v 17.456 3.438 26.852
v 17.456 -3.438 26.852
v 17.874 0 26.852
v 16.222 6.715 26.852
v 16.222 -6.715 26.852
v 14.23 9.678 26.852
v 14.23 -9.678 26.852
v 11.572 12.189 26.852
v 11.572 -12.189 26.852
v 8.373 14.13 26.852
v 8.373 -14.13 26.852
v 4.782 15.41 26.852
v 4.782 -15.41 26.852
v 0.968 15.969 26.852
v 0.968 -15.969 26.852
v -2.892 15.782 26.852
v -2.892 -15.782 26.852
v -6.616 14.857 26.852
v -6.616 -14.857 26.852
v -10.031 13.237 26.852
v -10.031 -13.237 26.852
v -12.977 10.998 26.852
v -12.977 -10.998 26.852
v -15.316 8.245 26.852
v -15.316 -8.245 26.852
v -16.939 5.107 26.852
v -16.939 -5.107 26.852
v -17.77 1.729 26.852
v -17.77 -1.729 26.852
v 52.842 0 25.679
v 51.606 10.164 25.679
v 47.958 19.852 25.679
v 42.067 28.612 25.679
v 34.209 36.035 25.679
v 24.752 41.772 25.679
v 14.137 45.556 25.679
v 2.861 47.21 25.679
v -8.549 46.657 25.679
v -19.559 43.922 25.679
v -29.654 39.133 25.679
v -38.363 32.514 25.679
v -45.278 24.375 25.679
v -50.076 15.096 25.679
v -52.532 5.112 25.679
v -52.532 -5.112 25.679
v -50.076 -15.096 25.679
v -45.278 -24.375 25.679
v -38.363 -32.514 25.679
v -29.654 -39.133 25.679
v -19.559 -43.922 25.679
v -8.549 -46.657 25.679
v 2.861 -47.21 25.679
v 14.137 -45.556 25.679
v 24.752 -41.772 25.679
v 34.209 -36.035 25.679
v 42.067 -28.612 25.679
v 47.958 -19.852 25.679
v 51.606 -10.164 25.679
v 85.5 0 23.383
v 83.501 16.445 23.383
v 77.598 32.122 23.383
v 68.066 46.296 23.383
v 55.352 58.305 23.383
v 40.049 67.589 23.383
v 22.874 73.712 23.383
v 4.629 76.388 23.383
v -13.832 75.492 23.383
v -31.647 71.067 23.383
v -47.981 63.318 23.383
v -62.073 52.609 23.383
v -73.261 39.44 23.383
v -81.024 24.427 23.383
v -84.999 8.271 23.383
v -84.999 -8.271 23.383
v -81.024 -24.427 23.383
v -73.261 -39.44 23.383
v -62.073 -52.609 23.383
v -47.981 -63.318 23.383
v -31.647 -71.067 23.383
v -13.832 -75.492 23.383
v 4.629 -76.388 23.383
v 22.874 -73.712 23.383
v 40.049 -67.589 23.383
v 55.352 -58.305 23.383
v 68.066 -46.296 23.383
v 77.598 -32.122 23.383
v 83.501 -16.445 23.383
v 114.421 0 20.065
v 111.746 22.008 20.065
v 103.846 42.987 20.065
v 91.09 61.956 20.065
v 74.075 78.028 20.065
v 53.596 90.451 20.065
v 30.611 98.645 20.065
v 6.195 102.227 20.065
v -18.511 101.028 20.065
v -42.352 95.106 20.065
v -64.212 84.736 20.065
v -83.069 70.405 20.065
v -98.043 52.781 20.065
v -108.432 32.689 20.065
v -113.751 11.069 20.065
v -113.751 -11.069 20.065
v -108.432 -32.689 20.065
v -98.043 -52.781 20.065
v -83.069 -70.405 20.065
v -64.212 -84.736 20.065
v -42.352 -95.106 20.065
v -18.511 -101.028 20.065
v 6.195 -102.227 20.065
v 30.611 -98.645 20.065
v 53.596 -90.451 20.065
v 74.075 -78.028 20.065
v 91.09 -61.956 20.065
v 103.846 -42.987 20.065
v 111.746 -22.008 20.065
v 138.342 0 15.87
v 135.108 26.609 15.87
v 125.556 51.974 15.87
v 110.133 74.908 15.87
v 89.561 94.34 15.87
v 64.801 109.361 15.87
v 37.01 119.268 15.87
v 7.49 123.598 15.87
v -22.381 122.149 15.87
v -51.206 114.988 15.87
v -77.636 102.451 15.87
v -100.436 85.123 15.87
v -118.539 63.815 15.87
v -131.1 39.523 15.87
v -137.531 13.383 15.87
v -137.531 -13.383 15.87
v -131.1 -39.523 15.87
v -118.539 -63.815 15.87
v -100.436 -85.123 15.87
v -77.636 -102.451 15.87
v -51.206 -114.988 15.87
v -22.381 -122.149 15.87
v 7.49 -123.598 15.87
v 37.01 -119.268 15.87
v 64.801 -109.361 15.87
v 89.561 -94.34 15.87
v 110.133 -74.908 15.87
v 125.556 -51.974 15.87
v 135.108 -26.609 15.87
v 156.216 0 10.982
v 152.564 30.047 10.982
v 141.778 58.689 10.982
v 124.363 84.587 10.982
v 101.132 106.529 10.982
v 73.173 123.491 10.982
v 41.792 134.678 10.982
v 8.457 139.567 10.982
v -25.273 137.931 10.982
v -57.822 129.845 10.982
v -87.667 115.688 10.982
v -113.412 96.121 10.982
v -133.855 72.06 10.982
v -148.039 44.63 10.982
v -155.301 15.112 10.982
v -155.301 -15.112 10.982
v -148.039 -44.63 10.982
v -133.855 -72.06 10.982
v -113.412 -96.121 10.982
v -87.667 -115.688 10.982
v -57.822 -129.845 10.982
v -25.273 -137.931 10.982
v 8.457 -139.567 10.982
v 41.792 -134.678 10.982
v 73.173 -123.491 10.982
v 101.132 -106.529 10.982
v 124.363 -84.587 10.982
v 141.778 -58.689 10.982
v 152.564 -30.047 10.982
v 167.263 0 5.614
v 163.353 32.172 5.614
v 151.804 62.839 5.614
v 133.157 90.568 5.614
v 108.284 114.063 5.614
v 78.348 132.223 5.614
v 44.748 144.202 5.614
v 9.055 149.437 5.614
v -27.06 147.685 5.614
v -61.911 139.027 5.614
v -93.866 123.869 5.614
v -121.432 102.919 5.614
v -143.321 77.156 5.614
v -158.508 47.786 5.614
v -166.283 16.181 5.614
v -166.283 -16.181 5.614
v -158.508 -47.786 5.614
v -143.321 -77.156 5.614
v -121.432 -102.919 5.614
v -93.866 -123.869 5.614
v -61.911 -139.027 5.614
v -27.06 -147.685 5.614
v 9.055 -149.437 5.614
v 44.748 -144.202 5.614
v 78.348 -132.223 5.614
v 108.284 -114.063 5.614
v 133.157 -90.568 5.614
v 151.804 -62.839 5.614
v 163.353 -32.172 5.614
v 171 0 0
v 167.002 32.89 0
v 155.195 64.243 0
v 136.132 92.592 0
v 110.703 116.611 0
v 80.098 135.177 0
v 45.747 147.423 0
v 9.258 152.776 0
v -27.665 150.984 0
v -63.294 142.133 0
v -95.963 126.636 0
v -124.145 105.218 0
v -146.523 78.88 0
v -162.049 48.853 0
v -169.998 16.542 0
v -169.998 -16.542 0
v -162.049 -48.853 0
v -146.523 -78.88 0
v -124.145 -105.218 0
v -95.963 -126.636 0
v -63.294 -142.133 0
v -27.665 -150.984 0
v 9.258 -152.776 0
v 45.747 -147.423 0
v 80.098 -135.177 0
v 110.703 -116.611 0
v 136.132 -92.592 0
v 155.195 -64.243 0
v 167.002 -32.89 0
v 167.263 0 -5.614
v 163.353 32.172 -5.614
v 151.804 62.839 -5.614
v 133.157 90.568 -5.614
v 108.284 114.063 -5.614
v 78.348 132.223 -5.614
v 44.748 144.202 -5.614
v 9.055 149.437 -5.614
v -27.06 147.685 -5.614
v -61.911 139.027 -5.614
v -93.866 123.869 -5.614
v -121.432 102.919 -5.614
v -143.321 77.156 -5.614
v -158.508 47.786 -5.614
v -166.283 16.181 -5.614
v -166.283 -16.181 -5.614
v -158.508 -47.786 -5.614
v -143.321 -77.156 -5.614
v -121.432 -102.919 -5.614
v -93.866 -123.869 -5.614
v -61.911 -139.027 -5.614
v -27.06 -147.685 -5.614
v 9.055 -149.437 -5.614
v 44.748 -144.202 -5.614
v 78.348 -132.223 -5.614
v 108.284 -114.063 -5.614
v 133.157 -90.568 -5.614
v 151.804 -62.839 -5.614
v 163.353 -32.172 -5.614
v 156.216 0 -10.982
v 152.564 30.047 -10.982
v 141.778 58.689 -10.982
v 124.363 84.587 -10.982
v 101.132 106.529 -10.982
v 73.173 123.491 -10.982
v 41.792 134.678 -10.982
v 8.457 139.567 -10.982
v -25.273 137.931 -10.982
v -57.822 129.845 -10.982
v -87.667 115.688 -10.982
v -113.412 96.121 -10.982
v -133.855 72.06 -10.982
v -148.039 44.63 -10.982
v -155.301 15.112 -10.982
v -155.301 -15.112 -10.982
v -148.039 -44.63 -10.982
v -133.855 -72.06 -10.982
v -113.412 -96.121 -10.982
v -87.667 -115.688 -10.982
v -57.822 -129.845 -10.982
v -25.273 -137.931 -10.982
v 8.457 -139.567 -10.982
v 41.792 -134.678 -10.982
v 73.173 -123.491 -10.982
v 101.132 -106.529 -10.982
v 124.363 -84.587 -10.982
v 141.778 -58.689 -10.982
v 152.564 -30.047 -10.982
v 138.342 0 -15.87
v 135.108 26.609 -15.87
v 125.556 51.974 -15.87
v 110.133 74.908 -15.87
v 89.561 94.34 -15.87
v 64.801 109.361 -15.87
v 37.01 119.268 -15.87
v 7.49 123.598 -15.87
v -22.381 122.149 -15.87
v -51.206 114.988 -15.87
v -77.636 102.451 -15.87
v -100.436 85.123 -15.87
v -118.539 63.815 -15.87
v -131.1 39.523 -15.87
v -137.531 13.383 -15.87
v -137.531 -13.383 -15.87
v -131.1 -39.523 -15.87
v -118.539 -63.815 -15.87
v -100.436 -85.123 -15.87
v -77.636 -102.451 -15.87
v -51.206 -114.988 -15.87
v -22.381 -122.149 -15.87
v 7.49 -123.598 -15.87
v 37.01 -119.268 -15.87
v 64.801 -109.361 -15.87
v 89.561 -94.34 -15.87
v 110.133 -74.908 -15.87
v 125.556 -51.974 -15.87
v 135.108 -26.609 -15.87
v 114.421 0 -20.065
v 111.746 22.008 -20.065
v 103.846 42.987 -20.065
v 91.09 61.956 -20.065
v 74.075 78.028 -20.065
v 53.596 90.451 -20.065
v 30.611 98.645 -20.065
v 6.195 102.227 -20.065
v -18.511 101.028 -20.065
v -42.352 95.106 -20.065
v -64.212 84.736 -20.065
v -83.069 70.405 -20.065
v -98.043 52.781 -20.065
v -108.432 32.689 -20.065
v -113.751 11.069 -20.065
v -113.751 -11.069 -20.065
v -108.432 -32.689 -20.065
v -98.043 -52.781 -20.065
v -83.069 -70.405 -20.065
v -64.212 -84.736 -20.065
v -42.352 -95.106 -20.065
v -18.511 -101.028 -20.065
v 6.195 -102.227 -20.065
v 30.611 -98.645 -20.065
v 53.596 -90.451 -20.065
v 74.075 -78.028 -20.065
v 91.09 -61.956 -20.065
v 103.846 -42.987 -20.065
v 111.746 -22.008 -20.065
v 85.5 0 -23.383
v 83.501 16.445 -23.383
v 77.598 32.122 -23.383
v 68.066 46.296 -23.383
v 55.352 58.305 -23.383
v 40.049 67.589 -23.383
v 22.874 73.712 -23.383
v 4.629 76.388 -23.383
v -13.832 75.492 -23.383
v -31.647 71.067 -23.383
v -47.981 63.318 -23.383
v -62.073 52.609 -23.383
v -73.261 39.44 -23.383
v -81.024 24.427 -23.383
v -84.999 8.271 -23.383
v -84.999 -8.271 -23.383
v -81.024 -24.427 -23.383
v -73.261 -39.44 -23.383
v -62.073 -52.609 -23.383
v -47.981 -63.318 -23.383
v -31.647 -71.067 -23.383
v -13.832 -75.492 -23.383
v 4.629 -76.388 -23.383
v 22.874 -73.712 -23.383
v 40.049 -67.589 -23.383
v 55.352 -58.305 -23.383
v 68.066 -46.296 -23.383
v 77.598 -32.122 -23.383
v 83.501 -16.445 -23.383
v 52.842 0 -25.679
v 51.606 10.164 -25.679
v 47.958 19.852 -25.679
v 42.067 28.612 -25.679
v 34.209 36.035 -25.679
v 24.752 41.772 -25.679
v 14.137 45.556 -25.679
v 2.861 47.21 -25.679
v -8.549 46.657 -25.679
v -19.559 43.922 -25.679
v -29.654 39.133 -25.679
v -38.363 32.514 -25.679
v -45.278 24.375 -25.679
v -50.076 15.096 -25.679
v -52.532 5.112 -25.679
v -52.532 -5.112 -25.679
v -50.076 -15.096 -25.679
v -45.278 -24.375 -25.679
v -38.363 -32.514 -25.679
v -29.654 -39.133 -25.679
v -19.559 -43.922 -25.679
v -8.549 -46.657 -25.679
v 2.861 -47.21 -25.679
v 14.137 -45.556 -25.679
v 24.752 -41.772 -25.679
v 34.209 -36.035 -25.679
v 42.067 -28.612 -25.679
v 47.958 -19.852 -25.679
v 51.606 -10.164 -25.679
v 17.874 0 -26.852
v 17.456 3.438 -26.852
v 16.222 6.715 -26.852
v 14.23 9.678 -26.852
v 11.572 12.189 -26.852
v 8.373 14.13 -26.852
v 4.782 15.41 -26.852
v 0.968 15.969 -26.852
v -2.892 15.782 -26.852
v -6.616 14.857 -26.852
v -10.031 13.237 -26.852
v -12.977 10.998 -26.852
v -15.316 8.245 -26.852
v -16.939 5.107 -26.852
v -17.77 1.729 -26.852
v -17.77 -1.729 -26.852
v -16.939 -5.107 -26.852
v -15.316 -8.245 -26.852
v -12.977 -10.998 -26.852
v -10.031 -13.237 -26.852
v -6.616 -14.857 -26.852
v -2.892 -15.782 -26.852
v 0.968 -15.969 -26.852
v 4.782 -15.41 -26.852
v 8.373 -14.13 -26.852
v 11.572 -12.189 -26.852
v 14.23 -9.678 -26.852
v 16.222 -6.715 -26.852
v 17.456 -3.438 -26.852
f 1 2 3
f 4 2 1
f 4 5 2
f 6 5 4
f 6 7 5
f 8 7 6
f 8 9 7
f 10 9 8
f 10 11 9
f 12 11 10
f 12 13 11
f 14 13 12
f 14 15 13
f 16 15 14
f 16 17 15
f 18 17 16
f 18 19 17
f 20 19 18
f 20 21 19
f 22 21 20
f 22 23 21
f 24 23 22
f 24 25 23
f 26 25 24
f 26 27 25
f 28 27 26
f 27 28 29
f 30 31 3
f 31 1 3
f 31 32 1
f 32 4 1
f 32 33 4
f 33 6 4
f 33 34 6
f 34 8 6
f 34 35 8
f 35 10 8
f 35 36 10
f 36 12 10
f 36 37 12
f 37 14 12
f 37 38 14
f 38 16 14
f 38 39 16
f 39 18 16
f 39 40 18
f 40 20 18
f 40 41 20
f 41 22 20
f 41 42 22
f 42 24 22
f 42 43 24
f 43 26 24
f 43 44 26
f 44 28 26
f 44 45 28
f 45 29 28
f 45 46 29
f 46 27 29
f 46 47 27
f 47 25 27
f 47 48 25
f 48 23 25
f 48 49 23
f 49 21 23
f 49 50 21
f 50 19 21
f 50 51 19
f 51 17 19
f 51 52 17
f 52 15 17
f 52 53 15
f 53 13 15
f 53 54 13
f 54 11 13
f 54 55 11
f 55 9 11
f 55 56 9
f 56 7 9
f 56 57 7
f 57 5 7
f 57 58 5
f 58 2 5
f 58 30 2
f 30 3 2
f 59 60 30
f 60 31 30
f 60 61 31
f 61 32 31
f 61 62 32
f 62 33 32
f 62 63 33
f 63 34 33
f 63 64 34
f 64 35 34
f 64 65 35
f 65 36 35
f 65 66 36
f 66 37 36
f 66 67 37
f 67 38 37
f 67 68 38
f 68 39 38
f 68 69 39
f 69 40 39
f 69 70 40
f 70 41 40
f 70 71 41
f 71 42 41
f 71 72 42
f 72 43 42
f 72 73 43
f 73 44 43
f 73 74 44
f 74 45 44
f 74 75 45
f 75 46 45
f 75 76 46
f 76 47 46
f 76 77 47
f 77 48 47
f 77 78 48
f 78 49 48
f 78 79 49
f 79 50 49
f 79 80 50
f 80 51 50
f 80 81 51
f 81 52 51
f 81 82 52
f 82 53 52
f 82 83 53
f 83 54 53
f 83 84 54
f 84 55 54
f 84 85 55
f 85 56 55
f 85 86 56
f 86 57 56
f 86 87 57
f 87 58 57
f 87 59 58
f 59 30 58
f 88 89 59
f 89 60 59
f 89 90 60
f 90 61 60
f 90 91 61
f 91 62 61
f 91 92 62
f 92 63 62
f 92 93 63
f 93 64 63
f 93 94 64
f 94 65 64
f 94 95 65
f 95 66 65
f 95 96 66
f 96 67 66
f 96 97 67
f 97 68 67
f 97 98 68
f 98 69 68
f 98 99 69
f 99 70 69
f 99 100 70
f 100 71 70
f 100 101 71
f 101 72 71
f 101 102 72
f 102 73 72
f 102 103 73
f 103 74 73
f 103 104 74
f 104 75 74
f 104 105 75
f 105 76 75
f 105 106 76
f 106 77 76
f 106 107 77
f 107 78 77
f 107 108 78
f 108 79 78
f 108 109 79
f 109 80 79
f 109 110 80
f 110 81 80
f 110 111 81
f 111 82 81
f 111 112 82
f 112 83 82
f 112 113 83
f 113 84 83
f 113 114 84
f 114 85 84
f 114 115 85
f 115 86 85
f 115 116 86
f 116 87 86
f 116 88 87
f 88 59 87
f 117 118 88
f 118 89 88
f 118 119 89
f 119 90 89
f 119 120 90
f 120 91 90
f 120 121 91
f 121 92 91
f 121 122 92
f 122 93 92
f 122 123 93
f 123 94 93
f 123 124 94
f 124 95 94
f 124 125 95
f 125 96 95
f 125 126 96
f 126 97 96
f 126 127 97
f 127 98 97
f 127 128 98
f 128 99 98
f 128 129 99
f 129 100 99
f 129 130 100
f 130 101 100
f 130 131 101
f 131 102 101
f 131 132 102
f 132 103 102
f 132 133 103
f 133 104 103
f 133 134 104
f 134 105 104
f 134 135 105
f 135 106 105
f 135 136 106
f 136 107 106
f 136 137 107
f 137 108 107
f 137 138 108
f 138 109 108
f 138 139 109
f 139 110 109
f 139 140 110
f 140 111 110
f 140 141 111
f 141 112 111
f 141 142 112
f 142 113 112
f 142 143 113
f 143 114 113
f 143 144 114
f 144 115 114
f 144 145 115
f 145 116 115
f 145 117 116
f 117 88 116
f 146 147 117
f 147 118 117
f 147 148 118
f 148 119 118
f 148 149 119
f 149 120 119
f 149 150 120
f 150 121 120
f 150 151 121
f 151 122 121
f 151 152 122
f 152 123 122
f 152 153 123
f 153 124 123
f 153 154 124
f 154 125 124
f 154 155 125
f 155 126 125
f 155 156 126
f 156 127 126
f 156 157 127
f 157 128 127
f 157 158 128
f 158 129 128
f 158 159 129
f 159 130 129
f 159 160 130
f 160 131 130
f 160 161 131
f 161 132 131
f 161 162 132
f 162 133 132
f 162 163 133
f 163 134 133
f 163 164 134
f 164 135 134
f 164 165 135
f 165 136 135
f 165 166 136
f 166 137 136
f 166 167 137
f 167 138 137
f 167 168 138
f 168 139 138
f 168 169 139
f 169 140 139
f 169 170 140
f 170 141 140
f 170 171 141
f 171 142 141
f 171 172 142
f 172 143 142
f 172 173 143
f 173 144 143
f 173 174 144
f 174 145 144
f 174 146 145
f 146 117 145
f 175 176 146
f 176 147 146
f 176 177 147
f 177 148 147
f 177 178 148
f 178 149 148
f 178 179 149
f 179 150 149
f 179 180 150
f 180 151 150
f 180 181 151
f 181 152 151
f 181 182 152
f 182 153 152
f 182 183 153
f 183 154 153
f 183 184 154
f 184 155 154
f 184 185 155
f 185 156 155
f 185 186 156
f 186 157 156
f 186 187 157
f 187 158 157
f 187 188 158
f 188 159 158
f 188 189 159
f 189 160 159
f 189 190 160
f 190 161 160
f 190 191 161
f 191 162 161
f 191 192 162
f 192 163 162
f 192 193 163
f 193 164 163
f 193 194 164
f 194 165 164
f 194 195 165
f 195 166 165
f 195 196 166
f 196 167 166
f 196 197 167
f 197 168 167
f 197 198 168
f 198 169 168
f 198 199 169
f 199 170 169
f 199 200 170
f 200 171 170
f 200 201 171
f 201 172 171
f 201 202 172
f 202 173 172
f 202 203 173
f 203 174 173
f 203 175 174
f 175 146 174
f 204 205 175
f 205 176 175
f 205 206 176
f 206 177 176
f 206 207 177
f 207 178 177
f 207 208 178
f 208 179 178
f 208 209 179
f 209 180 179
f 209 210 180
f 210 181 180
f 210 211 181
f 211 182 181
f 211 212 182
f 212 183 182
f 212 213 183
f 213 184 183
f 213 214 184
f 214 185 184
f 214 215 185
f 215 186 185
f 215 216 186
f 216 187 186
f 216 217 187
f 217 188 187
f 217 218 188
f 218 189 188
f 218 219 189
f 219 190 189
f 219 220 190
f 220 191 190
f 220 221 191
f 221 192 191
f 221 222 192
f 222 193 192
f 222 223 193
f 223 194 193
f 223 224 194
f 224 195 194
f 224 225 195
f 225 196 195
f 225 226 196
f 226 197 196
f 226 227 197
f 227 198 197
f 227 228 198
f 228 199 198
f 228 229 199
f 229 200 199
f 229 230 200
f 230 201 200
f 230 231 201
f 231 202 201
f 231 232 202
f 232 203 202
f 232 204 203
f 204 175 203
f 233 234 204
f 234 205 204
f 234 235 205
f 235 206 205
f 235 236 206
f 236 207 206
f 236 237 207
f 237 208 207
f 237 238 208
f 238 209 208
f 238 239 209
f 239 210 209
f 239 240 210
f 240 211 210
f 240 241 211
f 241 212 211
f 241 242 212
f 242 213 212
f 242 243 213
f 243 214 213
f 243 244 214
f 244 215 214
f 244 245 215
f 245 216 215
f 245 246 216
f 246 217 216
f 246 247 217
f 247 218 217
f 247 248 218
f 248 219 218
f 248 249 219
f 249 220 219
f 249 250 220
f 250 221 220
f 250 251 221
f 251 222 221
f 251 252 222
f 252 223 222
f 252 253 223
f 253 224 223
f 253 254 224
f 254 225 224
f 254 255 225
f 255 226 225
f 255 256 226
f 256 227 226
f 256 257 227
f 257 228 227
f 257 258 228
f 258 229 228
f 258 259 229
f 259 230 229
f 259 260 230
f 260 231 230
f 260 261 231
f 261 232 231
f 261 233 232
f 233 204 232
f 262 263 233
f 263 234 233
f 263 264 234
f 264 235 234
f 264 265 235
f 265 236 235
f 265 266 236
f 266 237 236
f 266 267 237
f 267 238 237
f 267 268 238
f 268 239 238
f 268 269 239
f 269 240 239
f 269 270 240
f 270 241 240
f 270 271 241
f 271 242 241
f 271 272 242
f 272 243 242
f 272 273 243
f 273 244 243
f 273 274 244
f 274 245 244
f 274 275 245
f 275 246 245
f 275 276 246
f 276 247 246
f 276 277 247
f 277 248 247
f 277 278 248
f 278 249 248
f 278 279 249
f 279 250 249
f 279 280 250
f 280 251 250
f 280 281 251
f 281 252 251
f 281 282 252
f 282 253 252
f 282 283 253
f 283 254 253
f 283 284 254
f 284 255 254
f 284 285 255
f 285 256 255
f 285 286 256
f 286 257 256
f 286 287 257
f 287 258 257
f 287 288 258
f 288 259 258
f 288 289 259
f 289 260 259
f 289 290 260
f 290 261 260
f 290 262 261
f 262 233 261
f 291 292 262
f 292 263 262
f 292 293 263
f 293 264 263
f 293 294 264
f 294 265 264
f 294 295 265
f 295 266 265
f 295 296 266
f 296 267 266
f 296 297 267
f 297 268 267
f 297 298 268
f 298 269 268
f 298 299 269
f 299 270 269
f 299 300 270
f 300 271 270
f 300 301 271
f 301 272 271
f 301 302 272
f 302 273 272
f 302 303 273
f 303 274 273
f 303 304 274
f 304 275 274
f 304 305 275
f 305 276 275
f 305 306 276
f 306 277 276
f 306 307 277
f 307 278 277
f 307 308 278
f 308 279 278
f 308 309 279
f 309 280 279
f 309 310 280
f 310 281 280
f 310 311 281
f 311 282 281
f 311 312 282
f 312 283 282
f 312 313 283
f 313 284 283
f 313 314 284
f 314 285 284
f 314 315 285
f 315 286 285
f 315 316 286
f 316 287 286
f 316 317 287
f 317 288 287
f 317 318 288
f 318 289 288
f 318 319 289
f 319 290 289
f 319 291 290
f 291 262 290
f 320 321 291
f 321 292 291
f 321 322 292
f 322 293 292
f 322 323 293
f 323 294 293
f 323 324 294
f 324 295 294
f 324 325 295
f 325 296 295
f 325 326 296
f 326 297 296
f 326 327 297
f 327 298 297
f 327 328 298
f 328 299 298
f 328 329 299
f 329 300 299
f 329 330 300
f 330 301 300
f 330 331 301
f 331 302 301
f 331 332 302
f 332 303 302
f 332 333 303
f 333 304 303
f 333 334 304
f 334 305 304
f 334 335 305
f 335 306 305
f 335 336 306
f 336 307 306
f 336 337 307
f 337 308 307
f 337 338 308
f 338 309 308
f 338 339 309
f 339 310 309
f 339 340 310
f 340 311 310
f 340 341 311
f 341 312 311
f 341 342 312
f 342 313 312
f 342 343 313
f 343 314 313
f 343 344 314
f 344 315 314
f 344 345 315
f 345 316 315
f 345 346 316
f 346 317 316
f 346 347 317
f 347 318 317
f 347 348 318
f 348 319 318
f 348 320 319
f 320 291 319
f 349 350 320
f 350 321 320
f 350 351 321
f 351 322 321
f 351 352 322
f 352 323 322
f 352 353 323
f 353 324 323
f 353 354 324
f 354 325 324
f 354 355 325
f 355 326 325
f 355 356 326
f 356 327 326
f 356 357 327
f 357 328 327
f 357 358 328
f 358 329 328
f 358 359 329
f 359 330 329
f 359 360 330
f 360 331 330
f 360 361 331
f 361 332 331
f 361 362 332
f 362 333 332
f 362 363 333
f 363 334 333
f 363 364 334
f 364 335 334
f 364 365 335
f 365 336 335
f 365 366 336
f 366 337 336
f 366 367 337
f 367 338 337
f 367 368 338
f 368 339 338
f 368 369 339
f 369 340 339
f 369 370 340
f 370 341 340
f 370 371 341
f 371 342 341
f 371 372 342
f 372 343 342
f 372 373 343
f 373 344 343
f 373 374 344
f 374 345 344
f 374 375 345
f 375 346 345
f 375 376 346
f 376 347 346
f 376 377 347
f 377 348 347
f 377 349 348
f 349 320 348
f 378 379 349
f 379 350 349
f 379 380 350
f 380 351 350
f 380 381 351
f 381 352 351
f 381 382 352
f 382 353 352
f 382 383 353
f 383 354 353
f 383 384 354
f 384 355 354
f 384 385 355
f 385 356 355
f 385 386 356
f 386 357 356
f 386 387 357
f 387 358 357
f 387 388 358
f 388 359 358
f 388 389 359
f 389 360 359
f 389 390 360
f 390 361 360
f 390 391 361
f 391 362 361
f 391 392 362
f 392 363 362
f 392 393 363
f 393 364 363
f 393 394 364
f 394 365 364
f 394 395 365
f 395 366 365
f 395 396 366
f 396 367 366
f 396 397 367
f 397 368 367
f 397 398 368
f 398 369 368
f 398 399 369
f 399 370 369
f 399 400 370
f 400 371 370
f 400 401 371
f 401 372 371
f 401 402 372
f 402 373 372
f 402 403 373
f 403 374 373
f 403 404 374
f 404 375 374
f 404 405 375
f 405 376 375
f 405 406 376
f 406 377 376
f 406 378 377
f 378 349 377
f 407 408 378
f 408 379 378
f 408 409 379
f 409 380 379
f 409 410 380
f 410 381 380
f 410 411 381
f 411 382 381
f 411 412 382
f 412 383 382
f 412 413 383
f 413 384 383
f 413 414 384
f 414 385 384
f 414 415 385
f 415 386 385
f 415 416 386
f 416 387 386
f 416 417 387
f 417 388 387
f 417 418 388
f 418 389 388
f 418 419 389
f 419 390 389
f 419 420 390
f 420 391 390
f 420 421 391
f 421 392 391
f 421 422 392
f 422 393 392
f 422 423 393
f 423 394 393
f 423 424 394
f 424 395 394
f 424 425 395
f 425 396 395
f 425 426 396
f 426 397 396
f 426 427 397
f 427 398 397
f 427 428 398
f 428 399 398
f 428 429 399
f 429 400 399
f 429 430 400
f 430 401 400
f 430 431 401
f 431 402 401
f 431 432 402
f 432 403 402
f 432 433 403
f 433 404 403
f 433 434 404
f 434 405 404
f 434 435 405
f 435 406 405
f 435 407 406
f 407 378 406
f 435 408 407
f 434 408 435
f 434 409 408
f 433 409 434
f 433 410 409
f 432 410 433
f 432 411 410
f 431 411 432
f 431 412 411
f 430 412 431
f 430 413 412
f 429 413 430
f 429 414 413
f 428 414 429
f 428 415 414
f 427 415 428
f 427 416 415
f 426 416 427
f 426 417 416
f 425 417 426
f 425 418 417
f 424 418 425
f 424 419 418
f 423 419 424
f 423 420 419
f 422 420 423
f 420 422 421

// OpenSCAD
// Generated by SolidPython 1.0.1 on 2020-07-29 00:46:54


scale(v = [19, 17, 3]) {
	sphere(r = 9);
}
/***********************************************
*********      SolidPython code:      **********
************************************************
 
# import packages: SolidPython
from solid import *
from solid.utils import *
from itertools import chain, combinations, permutations


class Resize:

    def __init__(self, scad_file):
        self.scad_file = scad_file
        #self.scad_file = import_scad(scad_file)
        # cone/cylinder param:
        self.r1 = 0
        self.r2 = 0
        self.h = 0
        # rectangular prism param:
        self.w = 0
        self.l = 0
        # ellipse param:
        self.r = 0

    # import OpenScad code (file name corresponds to shape)


    # classify shape + parameters
    def assign(self, param1, param2, param3):
        if self.scad_file == 'cone.scad':
            self.r1 = param1
            self.r2 = param2
            self.h = param3
        elif self.scad_file == 'cylinder.scad':
            self.r1 = param1
            self.r2 = param2
            self.h = param3
        elif self.scad_file == 'rectangularPrism.scad':
            self.h = param1
            self.l = param2
            self.w = param3
        else:
            self.r = param1
            self.h = param2

    # resize parameters
    def iterate(self):
        x = range(3, 20, 2)
        i = 1
        if self.scad_file == 'cone.scad':
            tempList = list(permutations(x, 2))
            for temp in tempList:
                param1 = temp[0]
                param2 = temp[1]
                filepath = 'produced_scad_files/' + 'cone' + str(param1) + '_' + str(param2) + '_' + '.scad'
                scad_render_to_file(cylinder(h=param1, r1=param2, r2=0), filepath)

        elif self.scad_file == 'cylinder.scad':
            tempList = list(permutations(x, 3))
            for temp in tempList:
                param1 = temp[0]
                param2 = temp[1]
                filepath = 'produced_scad_files/' + 'cylinder' + str(param1) + '_' + str(param2) + '_' + '.scad'
                scad_render_to_file(cylinder(h=param1, r1=param2, r2=param2), filepath)

        elif self.scad_file == 'rectangularPrism.scad':
            tempList = list(permutations(x, 3))
            for temp in tempList:
                param1 = temp[0]
                param2 = temp[1]
                param3 = temp[2]
                filepath = 'produced_scad_files/' + 'rectangularPrism' + str(param1) + '_' + str(param2) + '_' + str(
                    param3) + '.scad'
                scad_render_to_file(cube(size=(param1, param2, param3)), filepath)

        elif self.scad_file == 'ellipse.scad':
            tempList = list(permutations(x, 4))
            for temp in tempList:
                param1 = temp[0]
                param2 = temp[1]
                param3 = temp[2]
                param4 = temp[3]
                filepath = 'produced_scad_files/' + 'ellipse' + str(param1) + '_' + str(param2) + '_' + str(param3) + '_' + str(param4) + '.scad'
                scad_render_to_file(scale([param1, param2, param3])(sphere(r=param4)), filepath)

    def render_to_scadfile(self):
        scad_render_to_file(scad, 'example.scad') 
 
************************************************/
